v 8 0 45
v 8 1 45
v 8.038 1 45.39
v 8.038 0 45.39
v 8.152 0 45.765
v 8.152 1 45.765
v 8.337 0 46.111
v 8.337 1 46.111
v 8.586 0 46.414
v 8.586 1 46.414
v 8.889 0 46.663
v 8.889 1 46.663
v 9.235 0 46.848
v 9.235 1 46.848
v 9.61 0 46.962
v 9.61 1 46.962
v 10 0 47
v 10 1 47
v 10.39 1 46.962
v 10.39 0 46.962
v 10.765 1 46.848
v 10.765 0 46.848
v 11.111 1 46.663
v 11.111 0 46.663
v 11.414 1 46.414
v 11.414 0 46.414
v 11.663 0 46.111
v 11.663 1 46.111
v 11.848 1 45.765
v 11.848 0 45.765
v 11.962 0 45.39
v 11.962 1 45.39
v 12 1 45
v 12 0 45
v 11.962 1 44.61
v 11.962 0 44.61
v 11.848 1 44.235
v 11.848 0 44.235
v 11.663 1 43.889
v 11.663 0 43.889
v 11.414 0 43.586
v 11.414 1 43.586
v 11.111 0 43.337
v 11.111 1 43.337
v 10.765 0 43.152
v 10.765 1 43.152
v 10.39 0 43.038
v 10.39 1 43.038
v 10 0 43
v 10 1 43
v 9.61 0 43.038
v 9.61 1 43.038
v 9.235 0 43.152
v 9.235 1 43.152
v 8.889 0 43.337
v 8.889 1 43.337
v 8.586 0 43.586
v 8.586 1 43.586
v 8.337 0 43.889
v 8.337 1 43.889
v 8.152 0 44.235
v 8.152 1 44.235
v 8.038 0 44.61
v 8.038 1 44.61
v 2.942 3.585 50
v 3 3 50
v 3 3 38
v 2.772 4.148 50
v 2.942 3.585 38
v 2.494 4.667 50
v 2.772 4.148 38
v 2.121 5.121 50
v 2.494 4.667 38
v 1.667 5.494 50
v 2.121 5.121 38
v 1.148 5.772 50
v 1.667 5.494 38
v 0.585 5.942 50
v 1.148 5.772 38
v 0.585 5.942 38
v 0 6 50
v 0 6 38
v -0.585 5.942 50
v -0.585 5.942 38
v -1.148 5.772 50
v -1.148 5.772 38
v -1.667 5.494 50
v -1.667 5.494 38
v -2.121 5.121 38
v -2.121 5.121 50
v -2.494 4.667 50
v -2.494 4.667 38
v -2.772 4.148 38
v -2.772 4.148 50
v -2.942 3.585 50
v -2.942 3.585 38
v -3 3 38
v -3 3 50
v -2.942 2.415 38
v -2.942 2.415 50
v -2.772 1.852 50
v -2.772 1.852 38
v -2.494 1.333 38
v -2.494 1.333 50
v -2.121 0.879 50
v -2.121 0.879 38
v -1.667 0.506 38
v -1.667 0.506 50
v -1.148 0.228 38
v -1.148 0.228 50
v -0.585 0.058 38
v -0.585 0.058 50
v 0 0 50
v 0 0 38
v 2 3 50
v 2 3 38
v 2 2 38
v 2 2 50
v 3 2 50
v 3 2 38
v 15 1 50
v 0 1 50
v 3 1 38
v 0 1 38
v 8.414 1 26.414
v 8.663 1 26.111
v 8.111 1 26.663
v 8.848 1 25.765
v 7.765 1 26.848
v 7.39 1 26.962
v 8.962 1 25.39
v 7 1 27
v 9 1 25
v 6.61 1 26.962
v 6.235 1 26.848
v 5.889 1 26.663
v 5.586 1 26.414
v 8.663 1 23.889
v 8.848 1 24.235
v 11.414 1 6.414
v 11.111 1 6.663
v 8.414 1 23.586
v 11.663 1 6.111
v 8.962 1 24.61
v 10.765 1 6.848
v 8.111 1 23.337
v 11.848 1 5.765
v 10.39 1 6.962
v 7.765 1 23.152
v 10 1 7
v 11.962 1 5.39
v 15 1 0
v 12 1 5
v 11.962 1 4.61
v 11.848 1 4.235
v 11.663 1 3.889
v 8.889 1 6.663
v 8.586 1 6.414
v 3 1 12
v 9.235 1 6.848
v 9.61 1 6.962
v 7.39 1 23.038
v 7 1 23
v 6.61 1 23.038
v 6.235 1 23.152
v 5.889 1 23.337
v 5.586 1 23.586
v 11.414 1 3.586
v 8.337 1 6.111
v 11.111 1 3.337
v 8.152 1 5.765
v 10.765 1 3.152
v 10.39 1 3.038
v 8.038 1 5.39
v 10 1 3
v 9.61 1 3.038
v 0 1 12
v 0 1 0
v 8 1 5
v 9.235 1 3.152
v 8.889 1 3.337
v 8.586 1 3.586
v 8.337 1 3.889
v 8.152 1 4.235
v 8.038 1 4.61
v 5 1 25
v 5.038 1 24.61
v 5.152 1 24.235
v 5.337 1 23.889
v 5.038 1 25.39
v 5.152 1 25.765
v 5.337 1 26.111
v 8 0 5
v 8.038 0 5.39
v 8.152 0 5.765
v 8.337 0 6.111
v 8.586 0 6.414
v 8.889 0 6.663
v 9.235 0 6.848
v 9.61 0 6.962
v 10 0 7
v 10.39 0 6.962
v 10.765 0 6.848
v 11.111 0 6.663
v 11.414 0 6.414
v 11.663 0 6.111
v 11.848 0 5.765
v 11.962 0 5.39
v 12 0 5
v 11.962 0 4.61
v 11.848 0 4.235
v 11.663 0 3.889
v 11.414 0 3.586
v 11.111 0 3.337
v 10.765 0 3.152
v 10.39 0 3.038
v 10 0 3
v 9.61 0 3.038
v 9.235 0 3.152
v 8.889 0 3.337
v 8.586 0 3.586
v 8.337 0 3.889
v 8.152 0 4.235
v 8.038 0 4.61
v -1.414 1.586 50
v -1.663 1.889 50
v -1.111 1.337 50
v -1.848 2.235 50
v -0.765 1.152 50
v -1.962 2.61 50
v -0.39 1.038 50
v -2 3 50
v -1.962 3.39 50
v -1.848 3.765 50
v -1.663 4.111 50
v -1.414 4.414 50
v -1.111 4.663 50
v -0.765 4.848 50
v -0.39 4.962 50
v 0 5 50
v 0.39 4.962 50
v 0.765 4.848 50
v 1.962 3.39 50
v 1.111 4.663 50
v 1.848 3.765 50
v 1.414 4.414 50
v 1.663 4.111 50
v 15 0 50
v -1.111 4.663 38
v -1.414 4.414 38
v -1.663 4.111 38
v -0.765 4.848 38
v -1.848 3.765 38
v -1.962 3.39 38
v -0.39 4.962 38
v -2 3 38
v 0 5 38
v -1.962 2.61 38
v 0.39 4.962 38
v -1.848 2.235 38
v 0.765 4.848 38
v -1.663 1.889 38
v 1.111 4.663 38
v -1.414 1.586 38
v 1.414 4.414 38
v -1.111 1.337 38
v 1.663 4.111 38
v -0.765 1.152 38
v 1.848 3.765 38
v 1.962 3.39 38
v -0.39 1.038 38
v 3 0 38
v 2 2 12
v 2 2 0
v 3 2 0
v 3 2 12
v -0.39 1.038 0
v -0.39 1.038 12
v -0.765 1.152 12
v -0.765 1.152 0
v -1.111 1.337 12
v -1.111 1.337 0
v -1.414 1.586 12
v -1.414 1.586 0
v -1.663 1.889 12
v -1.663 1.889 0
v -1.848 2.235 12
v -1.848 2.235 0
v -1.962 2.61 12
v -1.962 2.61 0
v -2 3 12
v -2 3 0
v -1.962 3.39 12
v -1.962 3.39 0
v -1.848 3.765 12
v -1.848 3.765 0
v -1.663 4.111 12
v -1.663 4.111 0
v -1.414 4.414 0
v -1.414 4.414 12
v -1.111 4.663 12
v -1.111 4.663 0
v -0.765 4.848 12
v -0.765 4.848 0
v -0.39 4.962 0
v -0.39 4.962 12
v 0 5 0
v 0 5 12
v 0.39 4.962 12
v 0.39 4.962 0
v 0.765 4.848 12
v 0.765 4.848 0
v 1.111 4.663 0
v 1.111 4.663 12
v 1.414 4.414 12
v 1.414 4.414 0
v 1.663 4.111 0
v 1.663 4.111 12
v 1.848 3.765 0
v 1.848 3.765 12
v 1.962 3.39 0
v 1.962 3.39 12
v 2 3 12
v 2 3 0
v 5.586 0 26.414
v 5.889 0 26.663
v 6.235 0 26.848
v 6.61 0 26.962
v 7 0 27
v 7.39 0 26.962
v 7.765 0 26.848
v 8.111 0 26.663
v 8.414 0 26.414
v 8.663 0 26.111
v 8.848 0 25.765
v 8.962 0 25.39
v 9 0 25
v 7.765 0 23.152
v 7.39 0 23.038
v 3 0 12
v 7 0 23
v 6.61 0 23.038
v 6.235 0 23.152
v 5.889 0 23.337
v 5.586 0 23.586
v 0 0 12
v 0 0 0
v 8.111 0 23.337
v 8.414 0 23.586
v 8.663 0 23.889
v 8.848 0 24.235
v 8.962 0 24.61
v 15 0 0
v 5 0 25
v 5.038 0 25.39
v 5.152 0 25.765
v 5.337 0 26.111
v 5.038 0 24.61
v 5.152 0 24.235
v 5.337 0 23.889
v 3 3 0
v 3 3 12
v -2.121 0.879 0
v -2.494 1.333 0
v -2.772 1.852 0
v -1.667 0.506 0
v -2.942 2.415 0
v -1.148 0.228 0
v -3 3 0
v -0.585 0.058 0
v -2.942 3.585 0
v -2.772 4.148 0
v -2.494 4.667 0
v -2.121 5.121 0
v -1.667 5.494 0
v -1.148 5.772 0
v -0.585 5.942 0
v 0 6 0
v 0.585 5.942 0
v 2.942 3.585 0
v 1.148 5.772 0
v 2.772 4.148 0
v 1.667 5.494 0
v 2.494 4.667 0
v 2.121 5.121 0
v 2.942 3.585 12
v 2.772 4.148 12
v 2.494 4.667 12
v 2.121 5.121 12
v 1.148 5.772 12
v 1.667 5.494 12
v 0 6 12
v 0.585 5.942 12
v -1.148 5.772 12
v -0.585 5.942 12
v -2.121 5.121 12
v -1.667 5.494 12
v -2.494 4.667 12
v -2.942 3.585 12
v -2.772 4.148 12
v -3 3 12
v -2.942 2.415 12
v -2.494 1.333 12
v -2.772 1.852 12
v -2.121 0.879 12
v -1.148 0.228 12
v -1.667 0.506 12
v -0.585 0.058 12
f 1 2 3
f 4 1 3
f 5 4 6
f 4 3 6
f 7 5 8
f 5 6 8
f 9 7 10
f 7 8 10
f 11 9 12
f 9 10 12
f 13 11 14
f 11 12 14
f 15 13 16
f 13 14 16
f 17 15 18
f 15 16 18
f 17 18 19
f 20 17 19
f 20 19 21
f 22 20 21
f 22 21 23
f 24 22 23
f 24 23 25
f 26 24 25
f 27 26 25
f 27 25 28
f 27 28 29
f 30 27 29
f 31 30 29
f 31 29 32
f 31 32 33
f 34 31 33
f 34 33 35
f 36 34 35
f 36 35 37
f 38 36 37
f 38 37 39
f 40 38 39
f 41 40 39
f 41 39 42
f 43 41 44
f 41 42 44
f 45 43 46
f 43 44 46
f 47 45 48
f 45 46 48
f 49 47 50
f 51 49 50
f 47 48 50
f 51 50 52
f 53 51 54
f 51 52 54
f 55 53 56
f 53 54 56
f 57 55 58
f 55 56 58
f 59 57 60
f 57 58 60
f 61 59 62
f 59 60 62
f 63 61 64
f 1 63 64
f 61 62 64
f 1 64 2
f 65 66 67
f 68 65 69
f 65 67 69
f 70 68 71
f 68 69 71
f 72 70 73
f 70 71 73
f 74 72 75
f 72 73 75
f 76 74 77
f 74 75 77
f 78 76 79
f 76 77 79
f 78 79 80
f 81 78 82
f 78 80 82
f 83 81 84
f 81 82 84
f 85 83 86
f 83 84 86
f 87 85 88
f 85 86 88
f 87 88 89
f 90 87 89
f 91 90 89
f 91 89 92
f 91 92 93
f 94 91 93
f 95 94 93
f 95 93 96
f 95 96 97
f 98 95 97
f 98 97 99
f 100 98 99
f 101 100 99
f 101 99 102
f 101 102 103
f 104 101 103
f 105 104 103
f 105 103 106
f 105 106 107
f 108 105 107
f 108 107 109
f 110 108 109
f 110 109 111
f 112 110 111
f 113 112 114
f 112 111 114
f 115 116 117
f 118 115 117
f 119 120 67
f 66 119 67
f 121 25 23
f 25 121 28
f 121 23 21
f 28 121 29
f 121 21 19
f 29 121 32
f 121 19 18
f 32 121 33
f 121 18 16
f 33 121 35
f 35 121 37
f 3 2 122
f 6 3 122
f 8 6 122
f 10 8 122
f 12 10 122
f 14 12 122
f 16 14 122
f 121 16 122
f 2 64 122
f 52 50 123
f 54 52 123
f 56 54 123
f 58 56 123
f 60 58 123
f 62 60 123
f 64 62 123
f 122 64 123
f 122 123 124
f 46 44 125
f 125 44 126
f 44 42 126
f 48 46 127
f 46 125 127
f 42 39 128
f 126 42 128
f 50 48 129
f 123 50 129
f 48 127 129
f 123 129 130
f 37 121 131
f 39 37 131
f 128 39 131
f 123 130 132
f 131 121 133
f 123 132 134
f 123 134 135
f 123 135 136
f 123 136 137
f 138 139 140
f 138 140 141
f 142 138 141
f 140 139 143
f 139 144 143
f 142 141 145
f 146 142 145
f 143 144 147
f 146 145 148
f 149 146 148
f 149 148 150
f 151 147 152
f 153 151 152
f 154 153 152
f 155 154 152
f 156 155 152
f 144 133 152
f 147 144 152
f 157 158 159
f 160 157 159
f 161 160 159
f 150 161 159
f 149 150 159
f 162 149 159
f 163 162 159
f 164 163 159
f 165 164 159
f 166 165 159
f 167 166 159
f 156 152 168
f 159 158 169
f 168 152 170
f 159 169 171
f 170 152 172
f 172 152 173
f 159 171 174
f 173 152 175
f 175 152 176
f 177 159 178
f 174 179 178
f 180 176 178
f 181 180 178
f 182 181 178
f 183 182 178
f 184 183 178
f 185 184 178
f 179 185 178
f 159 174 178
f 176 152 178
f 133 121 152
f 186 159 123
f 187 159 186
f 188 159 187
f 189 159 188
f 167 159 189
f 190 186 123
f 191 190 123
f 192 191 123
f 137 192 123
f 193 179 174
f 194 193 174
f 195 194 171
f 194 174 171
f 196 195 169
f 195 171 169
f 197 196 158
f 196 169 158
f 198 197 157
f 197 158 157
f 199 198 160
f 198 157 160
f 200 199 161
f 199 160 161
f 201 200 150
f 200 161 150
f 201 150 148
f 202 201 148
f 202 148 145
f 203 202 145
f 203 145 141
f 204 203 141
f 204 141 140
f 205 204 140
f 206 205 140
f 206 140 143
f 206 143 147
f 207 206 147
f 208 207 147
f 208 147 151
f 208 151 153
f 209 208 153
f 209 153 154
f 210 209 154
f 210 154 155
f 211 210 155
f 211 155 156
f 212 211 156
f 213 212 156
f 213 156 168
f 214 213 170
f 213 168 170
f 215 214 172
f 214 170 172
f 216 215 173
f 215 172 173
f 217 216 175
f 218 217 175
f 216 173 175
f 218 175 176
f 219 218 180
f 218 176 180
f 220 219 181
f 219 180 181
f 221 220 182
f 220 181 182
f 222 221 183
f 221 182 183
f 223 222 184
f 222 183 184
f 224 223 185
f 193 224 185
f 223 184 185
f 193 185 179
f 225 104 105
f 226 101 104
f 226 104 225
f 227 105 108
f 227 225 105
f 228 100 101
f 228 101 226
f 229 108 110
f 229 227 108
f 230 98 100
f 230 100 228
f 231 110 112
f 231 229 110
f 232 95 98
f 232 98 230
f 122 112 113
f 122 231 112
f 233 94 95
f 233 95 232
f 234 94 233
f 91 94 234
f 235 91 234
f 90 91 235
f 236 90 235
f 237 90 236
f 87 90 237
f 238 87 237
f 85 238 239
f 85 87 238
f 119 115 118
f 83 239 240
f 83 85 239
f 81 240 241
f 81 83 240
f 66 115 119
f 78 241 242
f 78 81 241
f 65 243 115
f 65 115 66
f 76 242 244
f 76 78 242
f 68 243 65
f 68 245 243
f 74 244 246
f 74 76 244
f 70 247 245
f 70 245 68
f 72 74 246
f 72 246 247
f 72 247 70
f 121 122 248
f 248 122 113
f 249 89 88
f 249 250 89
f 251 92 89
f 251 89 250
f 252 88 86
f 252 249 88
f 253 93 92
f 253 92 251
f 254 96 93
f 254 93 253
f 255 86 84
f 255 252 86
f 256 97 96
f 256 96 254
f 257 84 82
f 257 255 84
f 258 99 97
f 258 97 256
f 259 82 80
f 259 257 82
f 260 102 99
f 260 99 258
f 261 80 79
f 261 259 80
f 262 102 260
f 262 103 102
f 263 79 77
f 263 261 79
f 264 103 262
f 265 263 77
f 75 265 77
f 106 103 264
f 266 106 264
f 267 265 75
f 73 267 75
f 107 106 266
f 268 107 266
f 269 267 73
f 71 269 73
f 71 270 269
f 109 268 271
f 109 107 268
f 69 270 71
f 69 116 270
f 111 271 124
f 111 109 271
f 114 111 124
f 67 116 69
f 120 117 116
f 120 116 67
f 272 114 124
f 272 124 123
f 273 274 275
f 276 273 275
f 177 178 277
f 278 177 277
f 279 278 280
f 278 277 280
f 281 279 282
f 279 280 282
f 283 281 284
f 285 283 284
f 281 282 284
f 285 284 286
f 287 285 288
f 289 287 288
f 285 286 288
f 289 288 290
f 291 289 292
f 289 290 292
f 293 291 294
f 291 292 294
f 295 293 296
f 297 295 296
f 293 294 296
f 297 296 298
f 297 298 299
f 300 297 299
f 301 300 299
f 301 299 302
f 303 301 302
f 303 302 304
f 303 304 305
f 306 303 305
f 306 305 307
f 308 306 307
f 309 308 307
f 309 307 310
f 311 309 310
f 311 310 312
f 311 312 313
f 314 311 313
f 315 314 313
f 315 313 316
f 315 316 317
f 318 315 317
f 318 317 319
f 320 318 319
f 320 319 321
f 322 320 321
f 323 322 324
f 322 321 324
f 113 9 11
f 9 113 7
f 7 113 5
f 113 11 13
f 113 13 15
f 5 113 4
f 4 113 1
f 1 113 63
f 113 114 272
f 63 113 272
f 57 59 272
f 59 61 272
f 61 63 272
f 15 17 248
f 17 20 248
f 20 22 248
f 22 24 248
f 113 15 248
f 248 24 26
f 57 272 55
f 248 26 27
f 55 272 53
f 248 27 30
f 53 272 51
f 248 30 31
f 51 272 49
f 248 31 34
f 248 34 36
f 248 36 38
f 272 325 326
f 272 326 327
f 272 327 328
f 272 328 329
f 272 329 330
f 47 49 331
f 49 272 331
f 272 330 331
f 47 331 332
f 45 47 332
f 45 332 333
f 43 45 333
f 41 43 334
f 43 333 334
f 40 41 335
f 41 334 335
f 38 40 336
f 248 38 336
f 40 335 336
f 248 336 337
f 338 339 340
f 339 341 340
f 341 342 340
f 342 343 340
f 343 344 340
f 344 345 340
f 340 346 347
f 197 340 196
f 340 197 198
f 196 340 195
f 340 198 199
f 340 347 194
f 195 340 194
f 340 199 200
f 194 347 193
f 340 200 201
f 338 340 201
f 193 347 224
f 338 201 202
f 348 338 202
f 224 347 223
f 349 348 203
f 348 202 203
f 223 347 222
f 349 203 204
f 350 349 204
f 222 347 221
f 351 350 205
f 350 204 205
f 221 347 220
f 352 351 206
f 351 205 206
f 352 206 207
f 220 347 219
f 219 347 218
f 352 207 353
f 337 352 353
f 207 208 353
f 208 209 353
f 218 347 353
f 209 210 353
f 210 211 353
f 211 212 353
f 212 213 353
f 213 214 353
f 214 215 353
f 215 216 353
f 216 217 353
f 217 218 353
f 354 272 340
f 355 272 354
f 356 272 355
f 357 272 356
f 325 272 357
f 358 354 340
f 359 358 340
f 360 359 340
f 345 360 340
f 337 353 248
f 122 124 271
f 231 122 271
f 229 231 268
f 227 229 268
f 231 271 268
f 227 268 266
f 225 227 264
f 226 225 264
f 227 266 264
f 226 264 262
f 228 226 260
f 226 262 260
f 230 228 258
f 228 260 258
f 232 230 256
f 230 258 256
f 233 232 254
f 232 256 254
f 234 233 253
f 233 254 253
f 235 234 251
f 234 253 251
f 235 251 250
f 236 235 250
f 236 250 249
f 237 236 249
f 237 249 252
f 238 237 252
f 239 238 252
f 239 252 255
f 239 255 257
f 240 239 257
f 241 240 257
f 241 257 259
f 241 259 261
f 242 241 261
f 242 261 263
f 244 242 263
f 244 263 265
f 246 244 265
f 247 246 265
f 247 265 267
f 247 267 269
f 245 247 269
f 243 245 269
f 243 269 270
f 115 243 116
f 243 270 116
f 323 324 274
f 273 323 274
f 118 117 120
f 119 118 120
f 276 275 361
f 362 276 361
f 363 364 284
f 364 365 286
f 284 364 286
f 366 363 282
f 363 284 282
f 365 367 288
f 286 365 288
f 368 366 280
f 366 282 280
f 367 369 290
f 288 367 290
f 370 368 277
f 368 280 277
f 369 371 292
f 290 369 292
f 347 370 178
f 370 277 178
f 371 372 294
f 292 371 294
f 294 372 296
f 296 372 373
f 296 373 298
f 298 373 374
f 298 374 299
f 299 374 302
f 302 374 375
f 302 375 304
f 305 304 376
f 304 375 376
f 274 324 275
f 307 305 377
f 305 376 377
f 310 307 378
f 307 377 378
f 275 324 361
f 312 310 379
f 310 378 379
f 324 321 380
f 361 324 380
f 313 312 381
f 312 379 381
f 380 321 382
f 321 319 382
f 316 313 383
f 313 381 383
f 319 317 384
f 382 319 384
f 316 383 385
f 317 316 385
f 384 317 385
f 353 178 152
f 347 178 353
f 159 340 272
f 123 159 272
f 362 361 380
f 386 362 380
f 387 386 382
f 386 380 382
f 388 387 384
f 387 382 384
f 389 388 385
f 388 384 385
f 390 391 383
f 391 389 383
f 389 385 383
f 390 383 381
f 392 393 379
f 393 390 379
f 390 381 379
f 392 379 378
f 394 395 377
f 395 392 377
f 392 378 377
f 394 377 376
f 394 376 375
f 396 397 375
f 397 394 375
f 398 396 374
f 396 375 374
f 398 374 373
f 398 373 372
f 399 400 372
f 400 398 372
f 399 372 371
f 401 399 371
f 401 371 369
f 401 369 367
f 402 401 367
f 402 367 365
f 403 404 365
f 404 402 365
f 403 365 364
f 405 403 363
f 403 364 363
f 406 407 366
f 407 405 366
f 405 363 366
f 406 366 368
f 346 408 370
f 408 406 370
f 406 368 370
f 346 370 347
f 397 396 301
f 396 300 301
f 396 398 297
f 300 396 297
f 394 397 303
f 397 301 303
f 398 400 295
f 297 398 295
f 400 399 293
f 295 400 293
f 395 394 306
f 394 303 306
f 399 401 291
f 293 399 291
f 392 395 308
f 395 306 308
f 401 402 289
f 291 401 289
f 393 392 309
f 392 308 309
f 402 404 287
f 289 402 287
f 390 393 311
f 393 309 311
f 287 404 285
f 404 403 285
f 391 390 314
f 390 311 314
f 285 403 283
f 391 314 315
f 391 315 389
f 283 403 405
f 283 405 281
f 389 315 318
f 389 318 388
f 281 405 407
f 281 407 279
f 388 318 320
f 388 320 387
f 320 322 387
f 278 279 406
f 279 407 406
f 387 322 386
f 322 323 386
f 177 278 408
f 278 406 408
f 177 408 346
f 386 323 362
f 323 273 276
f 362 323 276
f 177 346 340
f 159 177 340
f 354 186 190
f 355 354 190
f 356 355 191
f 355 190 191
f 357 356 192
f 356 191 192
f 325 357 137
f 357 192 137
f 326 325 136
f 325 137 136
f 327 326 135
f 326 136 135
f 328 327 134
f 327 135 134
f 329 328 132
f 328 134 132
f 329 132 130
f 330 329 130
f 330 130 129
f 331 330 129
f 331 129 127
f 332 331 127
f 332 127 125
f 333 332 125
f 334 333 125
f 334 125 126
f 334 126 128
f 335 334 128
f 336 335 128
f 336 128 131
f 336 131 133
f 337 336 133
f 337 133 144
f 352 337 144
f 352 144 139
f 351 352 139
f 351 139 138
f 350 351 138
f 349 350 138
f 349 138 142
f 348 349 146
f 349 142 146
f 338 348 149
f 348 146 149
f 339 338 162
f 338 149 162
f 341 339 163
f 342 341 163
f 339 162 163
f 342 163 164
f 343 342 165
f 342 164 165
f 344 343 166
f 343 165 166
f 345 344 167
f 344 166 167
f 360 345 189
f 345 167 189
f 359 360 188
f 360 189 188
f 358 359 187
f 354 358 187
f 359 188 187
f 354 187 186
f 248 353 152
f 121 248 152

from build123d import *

# Parameters (mm, degrees)
F1_DEPTH = 50
F3_D     = 4
F3_DEPTH = 10
F2_W     = 8
F2_H     = 26
F4_DEPTH = 25


with BuildPart() as f1:
    # F0 (on Top) → F1 (new body)
    with BuildSketch(Plane.XY):
        with BuildLine():
            Line((0, 0), (15, 0))
            Line((15, 0), (15, 1))
            Line((15, 1), (0, 1))
            ThreePointArc((0, 1), (-1.414214, 4.414214), (2, 3))
            Line((2, 3), (2, 2))
            Line((2, 2), (3, 2))
            Line((3, 2), (3, 3))
            ThreePointArc((3, 3), (-2.12132, 5.12132), (0, 0))
        make_face()
    extrude(amount=F1_DEPTH)

    # F3
    with Locations(Plane.XZ):
        with Locations((10, 45), (7, 25), (10, 5)):
            Hole(F3_D / 2, depth=F3_DEPTH)

    # F2 (on Front) → F4 (cut)
    with BuildSketch(Plane.XZ):
        with Locations((-1, 25)):
            Rectangle(F2_W, F2_H)
    extrude(amount=-F4_DEPTH, mode=Mode.SUBTRACT)


solid = f1.part
